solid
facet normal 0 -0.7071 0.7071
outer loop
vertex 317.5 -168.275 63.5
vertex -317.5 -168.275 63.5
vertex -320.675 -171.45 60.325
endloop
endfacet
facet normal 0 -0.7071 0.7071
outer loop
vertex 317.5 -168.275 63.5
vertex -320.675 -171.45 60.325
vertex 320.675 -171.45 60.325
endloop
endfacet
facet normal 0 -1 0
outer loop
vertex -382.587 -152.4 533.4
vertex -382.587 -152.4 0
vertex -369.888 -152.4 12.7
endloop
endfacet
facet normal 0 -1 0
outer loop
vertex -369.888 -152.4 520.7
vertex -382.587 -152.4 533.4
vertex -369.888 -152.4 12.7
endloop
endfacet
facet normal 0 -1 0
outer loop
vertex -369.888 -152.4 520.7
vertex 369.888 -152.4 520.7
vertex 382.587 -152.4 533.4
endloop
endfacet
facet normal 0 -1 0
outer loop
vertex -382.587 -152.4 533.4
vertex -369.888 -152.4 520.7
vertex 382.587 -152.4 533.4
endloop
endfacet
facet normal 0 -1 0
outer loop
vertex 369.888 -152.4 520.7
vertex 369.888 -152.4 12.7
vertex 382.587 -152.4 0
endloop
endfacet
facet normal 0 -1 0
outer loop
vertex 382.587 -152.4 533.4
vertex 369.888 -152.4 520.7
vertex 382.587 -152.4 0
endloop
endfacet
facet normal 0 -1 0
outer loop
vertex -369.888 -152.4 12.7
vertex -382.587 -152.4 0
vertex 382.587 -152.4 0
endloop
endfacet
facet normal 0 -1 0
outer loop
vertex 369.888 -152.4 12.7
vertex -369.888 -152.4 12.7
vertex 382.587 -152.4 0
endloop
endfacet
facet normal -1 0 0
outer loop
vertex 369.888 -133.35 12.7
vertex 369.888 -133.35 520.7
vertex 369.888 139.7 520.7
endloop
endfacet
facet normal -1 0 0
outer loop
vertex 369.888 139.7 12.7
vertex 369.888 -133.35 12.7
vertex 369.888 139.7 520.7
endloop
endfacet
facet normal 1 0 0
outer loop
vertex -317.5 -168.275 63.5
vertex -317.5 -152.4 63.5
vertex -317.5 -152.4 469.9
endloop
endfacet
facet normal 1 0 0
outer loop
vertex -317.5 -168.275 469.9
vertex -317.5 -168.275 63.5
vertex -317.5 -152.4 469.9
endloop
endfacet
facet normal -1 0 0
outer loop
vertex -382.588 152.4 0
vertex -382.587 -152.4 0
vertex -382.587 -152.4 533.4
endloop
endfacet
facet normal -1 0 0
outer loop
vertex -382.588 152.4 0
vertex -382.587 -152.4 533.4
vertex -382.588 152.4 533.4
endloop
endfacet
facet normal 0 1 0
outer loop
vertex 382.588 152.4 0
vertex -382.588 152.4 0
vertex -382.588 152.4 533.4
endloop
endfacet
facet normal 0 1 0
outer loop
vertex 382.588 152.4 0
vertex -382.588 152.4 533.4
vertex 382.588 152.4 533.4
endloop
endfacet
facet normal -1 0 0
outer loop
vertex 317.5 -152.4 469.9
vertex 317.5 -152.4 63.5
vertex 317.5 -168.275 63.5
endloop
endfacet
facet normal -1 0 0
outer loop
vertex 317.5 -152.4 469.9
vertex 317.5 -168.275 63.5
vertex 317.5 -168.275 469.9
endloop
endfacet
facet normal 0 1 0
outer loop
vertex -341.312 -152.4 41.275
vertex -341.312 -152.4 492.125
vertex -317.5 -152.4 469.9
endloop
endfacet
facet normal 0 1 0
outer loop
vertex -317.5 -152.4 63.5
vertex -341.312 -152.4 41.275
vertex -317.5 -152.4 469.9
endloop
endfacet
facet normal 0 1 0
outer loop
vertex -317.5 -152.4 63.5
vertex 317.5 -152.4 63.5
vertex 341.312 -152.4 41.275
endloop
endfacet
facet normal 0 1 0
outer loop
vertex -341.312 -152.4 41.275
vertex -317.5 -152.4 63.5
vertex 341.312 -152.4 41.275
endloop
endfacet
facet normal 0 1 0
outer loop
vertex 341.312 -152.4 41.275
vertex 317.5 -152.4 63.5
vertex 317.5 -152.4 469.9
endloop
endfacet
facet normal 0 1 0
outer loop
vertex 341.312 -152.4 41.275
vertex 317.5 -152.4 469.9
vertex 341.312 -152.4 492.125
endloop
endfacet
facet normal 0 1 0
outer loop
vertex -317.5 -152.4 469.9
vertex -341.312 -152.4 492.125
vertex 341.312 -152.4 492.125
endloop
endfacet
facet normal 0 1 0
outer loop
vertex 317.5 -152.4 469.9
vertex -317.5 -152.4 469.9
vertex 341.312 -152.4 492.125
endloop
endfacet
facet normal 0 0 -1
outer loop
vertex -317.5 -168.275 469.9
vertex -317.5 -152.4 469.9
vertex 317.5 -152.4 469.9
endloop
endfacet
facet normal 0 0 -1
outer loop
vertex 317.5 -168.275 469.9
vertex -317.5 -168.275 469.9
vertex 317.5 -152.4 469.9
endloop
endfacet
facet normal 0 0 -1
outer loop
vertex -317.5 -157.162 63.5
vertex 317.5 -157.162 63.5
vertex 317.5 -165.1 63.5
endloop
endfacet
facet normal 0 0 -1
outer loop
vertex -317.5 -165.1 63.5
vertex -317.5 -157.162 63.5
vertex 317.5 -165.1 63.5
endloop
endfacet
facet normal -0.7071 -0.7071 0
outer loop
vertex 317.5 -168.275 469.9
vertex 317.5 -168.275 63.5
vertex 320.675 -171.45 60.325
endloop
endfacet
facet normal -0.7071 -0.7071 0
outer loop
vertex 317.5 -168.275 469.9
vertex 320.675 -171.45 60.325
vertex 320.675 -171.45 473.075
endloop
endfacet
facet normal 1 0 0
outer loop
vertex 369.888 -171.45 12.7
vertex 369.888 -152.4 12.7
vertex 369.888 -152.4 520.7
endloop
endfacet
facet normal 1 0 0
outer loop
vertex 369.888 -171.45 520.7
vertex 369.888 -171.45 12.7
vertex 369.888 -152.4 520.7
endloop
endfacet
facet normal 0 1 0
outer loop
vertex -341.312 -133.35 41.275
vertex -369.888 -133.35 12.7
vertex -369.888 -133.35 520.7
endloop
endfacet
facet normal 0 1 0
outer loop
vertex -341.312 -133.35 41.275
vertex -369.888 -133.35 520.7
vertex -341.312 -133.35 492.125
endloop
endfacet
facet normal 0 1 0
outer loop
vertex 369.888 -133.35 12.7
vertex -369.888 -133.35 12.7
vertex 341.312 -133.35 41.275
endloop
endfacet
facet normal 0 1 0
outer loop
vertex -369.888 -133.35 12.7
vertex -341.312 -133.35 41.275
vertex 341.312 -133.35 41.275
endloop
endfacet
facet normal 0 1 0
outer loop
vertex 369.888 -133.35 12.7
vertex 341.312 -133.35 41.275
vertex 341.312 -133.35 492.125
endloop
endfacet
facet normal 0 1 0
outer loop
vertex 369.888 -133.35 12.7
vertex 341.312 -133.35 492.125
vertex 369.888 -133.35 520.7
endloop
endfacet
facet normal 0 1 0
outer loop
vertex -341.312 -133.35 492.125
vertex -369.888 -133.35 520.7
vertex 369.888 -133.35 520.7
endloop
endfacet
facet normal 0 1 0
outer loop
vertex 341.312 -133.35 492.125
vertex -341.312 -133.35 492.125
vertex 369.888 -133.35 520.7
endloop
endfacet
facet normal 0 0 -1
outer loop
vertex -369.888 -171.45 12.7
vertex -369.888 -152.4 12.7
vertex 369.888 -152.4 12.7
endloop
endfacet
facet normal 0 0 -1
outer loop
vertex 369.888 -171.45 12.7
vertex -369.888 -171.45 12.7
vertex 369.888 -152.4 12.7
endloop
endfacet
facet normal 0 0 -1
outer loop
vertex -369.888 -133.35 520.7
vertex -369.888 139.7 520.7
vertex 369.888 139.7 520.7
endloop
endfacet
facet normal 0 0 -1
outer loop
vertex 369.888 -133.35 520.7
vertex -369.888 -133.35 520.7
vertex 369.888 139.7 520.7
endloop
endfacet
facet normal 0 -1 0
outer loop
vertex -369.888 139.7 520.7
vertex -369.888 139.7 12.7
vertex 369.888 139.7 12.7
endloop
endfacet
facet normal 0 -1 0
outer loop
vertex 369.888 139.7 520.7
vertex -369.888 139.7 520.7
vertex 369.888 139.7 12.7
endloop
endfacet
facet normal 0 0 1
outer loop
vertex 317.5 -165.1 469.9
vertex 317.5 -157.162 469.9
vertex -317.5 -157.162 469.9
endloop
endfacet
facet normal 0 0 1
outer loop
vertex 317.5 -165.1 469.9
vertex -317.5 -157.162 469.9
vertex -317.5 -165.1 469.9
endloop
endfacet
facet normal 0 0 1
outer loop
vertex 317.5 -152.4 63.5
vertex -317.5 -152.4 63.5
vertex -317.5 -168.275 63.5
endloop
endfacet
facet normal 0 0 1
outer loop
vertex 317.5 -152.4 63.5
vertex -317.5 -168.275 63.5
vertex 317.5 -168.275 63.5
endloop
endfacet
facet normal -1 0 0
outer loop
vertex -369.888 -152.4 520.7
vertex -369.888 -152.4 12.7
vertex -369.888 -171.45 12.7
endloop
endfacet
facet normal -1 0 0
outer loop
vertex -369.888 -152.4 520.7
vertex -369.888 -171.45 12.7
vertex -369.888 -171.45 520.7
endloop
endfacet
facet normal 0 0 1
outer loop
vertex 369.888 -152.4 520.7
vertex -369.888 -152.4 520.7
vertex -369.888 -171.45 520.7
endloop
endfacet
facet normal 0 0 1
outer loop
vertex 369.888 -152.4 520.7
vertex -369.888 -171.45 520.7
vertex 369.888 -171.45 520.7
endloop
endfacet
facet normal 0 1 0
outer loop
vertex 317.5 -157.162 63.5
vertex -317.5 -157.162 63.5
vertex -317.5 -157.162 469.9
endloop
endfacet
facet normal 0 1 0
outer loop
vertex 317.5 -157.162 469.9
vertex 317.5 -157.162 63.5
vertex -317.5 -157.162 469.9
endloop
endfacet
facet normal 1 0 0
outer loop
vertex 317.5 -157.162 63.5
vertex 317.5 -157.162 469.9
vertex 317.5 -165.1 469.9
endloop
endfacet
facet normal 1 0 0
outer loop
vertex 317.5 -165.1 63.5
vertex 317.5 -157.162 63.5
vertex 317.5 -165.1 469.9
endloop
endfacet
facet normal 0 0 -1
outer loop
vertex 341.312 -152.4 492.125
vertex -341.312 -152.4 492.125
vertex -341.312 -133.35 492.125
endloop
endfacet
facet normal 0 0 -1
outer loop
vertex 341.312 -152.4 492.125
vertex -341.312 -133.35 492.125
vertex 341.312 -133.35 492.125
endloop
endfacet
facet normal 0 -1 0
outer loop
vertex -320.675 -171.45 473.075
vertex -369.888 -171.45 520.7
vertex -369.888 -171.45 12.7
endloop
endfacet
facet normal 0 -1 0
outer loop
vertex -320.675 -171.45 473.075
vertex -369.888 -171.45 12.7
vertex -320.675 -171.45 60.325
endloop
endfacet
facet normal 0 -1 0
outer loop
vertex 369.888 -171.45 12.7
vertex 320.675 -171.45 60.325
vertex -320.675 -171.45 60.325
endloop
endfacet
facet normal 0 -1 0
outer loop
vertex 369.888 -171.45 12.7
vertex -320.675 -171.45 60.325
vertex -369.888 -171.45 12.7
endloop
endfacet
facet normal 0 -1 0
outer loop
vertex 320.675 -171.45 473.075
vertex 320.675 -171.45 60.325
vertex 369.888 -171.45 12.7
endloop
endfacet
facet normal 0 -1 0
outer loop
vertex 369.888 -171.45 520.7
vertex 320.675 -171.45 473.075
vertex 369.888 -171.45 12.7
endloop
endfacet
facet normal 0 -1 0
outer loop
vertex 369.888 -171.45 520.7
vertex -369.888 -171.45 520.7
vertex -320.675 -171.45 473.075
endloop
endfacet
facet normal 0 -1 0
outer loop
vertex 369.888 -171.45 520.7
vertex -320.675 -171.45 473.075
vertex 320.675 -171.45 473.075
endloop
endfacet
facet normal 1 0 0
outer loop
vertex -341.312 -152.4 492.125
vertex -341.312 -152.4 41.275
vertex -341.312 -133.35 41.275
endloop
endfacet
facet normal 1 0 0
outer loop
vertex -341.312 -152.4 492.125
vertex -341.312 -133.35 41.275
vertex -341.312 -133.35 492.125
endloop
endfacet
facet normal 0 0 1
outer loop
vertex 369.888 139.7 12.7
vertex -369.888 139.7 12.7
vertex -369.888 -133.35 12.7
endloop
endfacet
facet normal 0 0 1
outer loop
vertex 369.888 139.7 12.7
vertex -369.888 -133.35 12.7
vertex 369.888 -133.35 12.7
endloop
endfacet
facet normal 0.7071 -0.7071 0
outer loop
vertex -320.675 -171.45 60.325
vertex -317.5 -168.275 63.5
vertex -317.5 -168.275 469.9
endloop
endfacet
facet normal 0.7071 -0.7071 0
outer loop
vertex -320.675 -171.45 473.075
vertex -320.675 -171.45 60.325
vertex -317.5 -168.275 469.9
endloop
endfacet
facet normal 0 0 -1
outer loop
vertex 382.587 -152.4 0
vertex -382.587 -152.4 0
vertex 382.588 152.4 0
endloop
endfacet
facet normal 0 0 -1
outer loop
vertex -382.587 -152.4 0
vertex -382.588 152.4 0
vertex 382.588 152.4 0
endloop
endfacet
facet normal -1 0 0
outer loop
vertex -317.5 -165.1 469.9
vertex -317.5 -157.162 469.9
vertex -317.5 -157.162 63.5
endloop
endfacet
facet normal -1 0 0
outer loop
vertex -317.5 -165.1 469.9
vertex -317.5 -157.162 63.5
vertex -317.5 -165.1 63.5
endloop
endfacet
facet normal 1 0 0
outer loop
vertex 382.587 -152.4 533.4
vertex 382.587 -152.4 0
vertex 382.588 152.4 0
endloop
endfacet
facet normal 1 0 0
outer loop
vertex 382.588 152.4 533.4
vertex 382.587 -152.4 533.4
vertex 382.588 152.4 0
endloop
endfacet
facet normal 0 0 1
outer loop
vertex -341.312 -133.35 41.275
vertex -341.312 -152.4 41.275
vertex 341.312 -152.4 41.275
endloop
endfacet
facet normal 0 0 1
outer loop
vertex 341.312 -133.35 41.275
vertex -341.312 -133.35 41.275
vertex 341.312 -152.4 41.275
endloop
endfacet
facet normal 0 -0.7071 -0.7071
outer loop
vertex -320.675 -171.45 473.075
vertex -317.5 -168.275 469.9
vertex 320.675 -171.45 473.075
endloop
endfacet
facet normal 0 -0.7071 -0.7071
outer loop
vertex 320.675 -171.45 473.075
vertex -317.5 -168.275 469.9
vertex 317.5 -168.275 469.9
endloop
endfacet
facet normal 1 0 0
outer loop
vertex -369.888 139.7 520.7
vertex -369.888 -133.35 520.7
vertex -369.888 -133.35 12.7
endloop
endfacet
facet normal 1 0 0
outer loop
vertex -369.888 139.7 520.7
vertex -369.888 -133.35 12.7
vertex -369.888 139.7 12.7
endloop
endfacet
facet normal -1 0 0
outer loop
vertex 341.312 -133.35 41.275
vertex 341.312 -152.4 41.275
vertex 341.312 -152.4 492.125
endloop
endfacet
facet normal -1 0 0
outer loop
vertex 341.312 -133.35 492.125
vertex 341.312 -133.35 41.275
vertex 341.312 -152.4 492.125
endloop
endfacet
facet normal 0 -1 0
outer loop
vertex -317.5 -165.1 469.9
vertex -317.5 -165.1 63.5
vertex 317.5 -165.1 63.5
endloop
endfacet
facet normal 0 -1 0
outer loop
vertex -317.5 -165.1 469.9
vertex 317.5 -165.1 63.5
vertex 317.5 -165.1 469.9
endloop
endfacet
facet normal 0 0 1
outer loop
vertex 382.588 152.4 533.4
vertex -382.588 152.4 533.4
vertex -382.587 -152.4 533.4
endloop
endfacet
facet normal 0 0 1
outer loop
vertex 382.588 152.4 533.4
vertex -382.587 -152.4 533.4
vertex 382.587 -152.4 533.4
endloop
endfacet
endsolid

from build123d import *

# Parameters (mm, degrees)
F0_W     = 765.175
F0_H     = 304.8
F1_DEPTH = 533.4
F2_T     = -12.7
F3_W     = 765.175
F3_H     = 533.4
F3_W_2   = 749.3
F3_H_2   = 520.7
F3_W_3   = 739.775
F3_H_3   = 508
F3_W_4   = 682.625
F3_H_4   = 450.85
F4_DEPTH = 19.05
F3_W_5   = 635
F3_H_5   = 406.4
F5_DEPTH = 19.05
F6_W     = 7.9375
F6_H     = 406.4
F7_DEPTH = 635
F8_SIZE  = 3.175


with BuildPart() as f1:
    # F0 (on Top) → F1 (new body)
    with BuildSketch(Plane.XY):
        Rectangle(F0_W, F0_H)
    extrude(amount=F1_DEPTH)

    # F2
    f2_openings = [f1.faces().sort_by_distance(p)[0] for p in [
        (0, -152.4, 266.7),
    ]]
    offset(amount=F2_T, openings=f2_openings)

    # F3 (on face) → F4 (join)
    with BuildSketch(Plane.XZ.offset(152.4)):
        with Locations((0, 266.7)):
            Rectangle(F3_W, F3_H)
        with Locations((0, 266.7)):
            Rectangle(F3_W_2, F3_H_2, mode=Mode.SUBTRACT)
        with Locations((0, 266.7)):
            Rectangle(F3_W_2, F3_H_2)
        with Locations((0, 266.7)):
            Rectangle(F3_W_3, F3_H_3, mode=Mode.SUBTRACT)
        with Locations((0, 266.7)):
            Rectangle(F3_W_3, F3_H_3)
        with Locations((0, 266.7)):
            Rectangle(F3_W_4, F3_H_4, mode=Mode.SUBTRACT)
    extrude(amount=-F4_DEPTH)

    # F3 (on face) → F5 (join)
    with BuildSketch(Plane.XZ.offset(152.4)):
        with Locations((0, 266.7)):
            Rectangle(F3_W_3, F3_H_3)
        with Locations((0, 266.7)):
            Rectangle(F3_W_4, F3_H_4, mode=Mode.SUBTRACT)
        with Locations((0, 266.7)):
            Rectangle(F3_W_4, F3_H_4)
        with Locations((0, 266.7)):
            Rectangle(F3_W_5, F3_H_5, mode=Mode.SUBTRACT)
    extrude(amount=F5_DEPTH)

    # F8
    f8_edges = [f1.edges().sort_by_distance(p)[0] for p in [
        (0, -171.45, 63.5),
        (-317.5, -171.45, 266.7),
        (0, -171.45, 469.9),
        (317.5, -171.45, 266.7),
    ]]
    chamfer(f8_edges, length=F8_SIZE)


with BuildPart() as f7:
    # F6 (on face) → F7 (new body, through all)
    with BuildSketch(Plane(origin=(317.5, 0, 0), x_dir=(0, -1, 0), z_dir=(-1, 0, 0))):
        with Locations((161.13125, 266.7)):
            Rectangle(F6_W, F6_H)
    extrude(amount=F7_DEPTH)


solid = Compound([f1.part, f7.part])
